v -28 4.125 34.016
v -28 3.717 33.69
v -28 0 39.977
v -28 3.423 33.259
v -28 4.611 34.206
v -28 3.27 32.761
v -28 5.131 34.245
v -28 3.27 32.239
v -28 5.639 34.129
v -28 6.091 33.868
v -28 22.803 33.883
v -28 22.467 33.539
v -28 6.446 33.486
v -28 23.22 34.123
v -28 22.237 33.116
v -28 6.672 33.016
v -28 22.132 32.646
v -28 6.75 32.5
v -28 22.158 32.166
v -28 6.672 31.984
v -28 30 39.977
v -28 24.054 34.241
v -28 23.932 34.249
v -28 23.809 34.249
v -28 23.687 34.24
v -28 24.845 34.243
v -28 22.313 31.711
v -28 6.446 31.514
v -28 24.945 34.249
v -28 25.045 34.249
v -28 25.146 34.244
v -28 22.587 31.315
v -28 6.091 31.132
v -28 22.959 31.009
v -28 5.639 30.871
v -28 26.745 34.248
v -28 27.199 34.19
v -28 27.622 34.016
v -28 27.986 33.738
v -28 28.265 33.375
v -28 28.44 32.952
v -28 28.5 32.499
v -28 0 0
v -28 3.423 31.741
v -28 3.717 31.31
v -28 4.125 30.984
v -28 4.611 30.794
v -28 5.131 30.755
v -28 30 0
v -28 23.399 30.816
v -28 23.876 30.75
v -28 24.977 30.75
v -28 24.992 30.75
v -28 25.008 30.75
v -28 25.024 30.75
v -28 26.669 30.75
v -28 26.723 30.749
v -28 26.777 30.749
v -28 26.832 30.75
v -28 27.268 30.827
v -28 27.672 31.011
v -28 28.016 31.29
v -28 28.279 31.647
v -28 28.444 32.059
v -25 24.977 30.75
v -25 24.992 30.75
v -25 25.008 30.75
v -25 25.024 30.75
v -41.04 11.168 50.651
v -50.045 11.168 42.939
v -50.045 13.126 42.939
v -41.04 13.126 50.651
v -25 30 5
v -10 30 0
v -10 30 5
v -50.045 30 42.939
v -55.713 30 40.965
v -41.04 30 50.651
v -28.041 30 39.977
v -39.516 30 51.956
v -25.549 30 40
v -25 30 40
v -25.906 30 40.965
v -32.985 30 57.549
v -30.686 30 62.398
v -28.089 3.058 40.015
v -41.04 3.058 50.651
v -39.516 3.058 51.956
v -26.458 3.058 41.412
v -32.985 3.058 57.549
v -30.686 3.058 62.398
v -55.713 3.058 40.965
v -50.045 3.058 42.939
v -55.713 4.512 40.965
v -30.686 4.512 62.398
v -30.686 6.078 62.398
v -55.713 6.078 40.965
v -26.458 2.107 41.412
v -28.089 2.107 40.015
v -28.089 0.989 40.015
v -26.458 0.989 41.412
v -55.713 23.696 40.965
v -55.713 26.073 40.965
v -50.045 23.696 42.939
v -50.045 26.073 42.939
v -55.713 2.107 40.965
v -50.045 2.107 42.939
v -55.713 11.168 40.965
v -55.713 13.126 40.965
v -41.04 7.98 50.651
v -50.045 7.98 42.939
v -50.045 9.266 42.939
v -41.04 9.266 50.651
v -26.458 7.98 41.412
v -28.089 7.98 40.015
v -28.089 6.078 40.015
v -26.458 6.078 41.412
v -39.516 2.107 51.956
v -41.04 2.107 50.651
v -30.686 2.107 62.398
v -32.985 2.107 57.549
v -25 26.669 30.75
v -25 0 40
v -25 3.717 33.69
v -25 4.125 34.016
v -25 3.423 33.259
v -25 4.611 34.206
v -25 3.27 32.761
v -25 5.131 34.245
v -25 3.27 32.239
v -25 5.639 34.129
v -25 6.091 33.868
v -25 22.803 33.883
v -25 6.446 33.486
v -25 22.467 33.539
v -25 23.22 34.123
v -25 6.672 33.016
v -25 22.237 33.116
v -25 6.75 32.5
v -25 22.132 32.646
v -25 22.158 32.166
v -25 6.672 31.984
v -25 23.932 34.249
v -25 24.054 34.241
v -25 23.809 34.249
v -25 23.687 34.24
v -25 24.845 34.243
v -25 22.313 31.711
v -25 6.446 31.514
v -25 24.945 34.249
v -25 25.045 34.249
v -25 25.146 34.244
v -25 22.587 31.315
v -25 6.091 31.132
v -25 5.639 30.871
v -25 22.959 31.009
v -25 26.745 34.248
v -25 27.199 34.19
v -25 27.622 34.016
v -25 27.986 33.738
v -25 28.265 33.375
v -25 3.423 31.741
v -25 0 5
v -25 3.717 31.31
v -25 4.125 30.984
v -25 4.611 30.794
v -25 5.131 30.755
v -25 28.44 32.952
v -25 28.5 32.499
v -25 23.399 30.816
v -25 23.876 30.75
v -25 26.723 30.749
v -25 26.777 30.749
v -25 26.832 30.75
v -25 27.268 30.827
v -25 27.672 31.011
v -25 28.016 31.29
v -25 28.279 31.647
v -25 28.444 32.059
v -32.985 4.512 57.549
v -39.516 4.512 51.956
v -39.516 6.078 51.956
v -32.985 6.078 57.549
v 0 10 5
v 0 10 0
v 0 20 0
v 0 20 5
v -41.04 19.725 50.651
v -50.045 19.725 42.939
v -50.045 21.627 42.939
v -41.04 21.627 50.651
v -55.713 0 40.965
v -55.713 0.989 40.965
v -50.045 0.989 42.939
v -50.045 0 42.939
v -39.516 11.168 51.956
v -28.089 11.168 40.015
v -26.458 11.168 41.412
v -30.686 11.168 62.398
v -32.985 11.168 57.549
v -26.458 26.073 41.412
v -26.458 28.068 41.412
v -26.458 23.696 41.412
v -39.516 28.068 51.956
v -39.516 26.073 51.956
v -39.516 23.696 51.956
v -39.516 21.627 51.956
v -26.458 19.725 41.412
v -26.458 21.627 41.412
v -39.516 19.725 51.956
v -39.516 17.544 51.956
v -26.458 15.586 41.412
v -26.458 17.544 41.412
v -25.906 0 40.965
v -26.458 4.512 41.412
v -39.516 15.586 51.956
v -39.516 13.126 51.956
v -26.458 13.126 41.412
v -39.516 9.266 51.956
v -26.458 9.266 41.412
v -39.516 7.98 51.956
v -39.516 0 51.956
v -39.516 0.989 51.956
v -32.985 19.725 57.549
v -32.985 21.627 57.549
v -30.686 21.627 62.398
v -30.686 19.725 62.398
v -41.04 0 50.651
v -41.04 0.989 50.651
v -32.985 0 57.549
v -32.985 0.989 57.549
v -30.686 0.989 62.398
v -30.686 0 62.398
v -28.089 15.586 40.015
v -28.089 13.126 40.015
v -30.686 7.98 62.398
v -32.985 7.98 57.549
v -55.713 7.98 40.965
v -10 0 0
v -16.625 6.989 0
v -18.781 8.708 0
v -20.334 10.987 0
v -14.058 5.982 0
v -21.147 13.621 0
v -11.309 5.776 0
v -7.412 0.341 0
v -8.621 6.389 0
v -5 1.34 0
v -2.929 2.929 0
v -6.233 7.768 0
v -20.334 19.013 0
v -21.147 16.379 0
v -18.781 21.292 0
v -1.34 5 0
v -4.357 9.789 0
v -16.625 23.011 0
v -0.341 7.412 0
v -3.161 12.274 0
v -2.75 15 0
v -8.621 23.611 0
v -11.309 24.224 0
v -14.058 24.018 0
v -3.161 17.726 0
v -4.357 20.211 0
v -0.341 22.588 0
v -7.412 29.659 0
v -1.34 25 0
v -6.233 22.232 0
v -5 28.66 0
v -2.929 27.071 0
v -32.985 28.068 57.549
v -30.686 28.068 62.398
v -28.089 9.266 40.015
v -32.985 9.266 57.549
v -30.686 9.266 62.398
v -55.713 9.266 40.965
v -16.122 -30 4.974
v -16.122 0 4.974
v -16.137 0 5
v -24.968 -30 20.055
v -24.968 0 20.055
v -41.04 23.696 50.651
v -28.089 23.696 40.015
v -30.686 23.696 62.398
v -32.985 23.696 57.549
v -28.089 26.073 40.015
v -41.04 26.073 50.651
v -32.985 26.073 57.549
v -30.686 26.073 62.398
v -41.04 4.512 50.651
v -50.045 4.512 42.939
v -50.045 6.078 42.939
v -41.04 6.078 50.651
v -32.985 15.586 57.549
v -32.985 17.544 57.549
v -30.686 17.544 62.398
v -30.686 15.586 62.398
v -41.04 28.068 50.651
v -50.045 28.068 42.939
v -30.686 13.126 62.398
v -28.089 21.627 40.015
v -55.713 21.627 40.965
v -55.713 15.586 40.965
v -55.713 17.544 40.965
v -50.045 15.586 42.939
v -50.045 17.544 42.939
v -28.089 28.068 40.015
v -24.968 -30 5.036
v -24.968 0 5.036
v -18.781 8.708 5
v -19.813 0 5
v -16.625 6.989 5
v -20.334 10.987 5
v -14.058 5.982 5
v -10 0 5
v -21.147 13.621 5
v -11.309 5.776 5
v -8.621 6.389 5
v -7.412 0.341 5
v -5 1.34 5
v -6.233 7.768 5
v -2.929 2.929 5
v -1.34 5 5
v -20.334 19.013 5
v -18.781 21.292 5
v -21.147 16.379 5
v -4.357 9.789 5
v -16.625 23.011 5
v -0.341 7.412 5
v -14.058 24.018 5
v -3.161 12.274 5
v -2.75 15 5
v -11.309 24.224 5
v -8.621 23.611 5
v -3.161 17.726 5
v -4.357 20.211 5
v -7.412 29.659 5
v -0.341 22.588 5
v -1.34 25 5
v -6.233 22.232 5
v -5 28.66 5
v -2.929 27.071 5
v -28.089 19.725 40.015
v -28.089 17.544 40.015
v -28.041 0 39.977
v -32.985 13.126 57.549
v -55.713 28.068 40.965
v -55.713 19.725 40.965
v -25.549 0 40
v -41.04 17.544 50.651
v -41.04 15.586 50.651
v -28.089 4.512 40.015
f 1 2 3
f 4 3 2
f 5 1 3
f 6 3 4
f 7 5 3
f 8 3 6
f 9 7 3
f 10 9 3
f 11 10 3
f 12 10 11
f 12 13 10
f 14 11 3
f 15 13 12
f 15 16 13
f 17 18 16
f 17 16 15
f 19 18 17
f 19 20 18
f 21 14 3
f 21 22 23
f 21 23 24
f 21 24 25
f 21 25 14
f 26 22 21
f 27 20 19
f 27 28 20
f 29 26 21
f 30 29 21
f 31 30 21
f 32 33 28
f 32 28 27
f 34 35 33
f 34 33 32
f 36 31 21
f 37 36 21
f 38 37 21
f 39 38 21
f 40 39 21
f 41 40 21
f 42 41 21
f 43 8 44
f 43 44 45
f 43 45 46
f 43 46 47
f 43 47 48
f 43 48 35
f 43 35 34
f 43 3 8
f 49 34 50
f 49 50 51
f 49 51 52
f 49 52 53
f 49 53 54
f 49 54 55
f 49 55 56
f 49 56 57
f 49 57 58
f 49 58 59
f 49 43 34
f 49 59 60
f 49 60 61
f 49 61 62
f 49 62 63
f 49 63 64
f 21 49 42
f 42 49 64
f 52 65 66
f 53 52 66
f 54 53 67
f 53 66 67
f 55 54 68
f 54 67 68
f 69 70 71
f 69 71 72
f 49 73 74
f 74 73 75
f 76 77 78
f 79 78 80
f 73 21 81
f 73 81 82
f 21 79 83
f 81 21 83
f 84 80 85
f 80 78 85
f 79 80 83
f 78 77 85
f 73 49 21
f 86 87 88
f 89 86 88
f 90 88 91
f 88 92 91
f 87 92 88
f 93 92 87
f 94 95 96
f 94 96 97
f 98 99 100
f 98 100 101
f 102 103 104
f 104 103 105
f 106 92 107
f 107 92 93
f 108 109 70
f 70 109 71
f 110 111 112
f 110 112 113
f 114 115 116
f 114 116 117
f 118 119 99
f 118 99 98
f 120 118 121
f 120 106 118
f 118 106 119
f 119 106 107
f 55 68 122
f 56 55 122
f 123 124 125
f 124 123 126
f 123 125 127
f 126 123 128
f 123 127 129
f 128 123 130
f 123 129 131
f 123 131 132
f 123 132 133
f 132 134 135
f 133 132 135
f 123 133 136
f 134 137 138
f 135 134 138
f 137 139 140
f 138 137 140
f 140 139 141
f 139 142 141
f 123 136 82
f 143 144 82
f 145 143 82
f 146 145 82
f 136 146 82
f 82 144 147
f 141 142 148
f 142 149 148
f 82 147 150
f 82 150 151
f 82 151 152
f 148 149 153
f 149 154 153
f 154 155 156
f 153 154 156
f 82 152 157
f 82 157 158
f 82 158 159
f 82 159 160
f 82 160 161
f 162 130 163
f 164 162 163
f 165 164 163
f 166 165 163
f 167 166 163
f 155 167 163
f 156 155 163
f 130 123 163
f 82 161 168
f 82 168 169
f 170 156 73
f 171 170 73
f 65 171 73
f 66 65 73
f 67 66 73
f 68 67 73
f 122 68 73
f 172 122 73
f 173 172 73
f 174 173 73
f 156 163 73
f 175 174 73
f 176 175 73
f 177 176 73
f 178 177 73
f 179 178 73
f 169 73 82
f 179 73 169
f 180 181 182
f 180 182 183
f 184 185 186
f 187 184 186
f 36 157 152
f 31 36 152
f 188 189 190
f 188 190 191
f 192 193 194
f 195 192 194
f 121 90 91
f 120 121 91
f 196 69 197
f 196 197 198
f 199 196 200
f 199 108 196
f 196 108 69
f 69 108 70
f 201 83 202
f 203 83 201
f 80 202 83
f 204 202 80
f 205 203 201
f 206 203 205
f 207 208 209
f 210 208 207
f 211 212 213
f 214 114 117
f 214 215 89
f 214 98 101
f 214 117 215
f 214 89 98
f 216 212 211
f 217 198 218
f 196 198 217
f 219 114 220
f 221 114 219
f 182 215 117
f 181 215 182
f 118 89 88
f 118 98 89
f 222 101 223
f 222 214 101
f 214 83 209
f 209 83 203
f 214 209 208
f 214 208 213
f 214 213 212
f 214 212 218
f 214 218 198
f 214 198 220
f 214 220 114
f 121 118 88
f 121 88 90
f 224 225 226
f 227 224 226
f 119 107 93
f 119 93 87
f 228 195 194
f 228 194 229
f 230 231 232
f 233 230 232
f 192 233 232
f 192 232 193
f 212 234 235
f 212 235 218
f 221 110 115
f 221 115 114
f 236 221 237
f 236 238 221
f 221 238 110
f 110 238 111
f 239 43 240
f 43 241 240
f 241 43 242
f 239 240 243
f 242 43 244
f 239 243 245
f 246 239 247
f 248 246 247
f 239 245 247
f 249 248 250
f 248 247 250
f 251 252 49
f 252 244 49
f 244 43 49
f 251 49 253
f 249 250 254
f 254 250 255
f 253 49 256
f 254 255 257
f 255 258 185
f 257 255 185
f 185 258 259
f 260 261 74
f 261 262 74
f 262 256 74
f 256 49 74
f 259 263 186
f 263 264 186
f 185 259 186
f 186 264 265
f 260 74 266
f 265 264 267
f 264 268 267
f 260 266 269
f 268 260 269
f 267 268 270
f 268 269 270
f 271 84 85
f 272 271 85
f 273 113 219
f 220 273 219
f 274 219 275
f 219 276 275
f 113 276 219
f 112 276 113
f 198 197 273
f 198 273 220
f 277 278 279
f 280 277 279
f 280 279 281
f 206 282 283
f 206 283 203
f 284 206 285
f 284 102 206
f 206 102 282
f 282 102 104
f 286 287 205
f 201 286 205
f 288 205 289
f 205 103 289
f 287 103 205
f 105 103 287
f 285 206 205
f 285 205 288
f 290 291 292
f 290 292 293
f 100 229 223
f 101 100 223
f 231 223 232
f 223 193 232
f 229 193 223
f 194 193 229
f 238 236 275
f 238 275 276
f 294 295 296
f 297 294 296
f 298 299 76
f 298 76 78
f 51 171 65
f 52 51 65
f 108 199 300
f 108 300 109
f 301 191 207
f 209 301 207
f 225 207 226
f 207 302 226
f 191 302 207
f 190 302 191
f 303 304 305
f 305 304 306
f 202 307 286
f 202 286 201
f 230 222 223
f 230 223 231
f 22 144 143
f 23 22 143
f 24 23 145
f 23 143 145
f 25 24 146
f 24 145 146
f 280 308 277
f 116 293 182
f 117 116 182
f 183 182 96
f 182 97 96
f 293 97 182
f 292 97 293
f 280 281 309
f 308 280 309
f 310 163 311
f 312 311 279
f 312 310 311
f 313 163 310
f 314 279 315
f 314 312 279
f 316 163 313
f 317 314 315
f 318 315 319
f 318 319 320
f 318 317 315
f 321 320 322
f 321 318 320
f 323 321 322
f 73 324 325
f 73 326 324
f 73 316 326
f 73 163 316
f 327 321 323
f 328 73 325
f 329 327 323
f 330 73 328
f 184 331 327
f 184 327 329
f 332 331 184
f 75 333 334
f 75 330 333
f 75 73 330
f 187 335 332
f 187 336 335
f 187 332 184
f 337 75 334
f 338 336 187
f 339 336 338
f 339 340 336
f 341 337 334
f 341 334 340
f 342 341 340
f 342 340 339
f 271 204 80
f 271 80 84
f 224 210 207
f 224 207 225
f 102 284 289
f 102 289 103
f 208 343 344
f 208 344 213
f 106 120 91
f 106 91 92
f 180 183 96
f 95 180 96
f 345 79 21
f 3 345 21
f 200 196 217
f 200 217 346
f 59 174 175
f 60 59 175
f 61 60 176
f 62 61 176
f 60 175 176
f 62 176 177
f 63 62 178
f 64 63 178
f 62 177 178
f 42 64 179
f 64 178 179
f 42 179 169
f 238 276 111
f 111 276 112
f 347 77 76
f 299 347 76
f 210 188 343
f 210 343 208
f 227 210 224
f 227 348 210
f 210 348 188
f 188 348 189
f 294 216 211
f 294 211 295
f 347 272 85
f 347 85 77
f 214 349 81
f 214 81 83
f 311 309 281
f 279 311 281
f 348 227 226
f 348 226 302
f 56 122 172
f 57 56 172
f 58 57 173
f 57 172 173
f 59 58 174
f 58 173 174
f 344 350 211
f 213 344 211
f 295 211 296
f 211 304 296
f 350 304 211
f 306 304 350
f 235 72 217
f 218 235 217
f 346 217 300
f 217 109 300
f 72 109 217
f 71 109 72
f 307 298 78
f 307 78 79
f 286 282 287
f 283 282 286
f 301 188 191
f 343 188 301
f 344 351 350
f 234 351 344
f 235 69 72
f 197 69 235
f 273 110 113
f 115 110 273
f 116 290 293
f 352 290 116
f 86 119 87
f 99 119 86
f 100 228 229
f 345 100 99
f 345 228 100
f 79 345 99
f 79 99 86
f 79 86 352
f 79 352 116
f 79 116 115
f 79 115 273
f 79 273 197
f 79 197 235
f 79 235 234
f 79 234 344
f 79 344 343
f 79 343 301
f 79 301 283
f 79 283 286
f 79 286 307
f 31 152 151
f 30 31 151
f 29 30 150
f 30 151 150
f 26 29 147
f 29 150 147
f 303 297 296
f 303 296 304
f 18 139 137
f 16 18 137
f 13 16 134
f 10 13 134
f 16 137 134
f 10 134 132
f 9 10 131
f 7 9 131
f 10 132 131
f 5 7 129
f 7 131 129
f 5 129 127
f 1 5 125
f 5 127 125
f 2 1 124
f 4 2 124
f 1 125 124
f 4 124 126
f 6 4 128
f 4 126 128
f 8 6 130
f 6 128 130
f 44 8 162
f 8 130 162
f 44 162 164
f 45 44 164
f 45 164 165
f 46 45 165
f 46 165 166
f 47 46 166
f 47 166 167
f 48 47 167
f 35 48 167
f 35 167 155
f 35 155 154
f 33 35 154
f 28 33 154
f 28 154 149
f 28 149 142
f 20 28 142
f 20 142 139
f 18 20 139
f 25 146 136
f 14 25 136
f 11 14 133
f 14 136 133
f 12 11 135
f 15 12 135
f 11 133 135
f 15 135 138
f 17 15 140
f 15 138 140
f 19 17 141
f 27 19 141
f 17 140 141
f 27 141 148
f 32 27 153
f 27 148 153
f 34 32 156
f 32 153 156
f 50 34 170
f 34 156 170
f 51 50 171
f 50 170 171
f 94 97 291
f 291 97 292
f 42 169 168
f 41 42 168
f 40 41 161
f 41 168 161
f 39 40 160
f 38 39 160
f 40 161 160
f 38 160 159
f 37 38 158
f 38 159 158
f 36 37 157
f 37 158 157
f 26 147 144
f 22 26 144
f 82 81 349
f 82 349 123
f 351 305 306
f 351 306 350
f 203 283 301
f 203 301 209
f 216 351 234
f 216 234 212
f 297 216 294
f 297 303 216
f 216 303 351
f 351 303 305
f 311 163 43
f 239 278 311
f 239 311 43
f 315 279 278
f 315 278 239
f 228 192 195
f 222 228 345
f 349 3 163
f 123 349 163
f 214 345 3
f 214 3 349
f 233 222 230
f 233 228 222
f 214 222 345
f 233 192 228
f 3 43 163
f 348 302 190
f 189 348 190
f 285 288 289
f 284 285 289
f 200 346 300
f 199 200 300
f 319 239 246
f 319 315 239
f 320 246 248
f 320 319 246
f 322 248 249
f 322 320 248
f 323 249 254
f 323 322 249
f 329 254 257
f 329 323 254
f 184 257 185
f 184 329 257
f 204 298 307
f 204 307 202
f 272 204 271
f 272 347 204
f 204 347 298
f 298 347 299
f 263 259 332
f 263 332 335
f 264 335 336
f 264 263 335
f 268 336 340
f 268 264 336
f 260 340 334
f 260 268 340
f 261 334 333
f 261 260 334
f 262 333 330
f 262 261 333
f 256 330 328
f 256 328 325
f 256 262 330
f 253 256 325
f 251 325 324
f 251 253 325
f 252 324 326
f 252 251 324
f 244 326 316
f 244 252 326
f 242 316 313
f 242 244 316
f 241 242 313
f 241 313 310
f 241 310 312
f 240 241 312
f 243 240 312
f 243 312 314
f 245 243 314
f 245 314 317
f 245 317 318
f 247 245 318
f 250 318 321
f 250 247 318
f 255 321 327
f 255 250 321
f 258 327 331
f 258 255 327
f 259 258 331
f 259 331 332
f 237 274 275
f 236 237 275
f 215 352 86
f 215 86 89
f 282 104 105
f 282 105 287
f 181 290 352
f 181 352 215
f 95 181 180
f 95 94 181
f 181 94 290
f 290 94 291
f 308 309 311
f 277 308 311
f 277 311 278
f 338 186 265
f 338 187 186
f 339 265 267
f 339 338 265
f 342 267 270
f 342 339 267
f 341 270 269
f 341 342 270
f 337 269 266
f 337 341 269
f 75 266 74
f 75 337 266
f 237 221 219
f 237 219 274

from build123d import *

# Parameters (mm, degrees)
F0_W      = 25
F0_H      = 30
F0_R      = 9.25
F0_W_2    = 3
F1_DEPTH  = 5
F2_DEPTH  = 40
F3_R      = 10
F4_R      = 1.75
F5_DEPTH  = 3.001
F7_DEPTH  = 30
F8_W      = 32.9495297466
F8_H      = 1.9953548908
F8_H_2    = 2.0693931729
F8_H_3    = 2.1812524647
F8_H_4    = 2.4609006941
F8_H_5    = 1.9016051665
F8_H_6    = 1.9016047008
F8_H_7    = 1.454168465
F8_H_8    = 1.1185912881
F9_DEPTH  = 18.69
F11_DEPTH = 30.001
F13_DEPTH = 30


with BuildPart() as f1:
    # F0 (on Top) → F1 (new body)
    with BuildSketch(Plane.XY):
        with Locations((-12.5, 15)):
            Rectangle(F0_W, F0_H)
        with Locations((-12, 15)):
            Circle(F0_R, mode=Mode.SUBTRACT)
        with Locations((-26.5, 15)):
            Rectangle(F0_W_2, F0_H)
    extrude(amount=F1_DEPTH)

    # F0 (on Top) → F2 (join)
    with BuildSketch(Plane.XY):
        with Locations((-26.5, 15)):
            Rectangle(F0_W_2, F0_H)
    extrude(amount=F2_DEPTH)

    # F3
    f3_edges = [f1.edges().sort_by_distance(p)[0] for p in [
        (0, 0, 2.5),
        (0, 30, 2.5),
    ]]
    fillet(f3_edges, radius=F3_R)

    # F4 (on face) → F5 (cut, through all)
    with BuildSketch(Plane.YZ.offset(-25)):
        with Locations((5, 32.5)):
            Circle(F4_R)
        with BuildLine():
            ThreePointArc((25.8762976423, 34.0147945214), (26.5159190074, 33.3743509381), (26.75, 32.5))
            ThreePointArc((26.75, 32.5), (26.5151696279, 31.6243510986), (25.8737017159, 30.9837067198))
            ThreePointArc((25.8737017159, 30.9837067198), (26.2572446424, 30.8193071518), (26.6688053839, 30.7503858164))
            Line((26.6688053839, 30.7503858164), (26.8316769531, 30.7504083459))
            ThreePointArc((26.8316769531, 30.7504083459), (28.015984309, 31.290286813), (28.4999993582, 32.4985012412))
            ThreePointArc((28.4999993582, 32.4985012412), (27.9856735638, 33.7376982625), (26.7450173494, 34.2484941496))
            ThreePointArc((26.7450173494, 34.2484941496), (26.2953839701, 34.1884198336), (25.8762976423, 34.0147945214))
        make_face()
        with BuildLine():
            ThreePointArc((25.313264961, 33.4976480132), (25.5661966357, 33.7873422376), (25.8762976423, 34.0147945214))
            ThreePointArc((25.8762976423, 34.0147945214), (25.5235901108, 34.1698363381), (25.1455039627, 34.2439405371))
            Line((25.1455039627, 34.2439405371), (24.8445689194, 34.243083813))
            ThreePointArc((24.8445689194, 34.243083813), (24.6385972754, 34.2122756994), (24.4377440921, 34.1572170329))
            ThreePointArc((24.4377440921, 34.1572170329), (24.9284794863, 33.8977522036), (25.313264961, 33.4976480132))
        make_face()
        with BuildLine():
            ThreePointArc((25.1455039627, 34.2439405371), (25.5235901108, 34.1698363381), (25.8762976423, 34.0147945214))
            ThreePointArc((25.8762976423, 34.0147945214), (26.2953839701, 34.1884198336), (26.7450173494, 34.2484941496))
            Line((26.7450173494, 34.2484941496), (25.1455039627, 34.2439405371))
        make_face()
        with BuildLine():
            ThreePointArc((26.6688053839, 30.7503858164), (26.2572446424, 30.8193071518), (25.8737017159, 30.9837067198))
            ThreePointArc((25.8737017159, 30.9837067198), (25.4635661352, 30.8125147591), (25.0235325622, 30.7501582304))
            Line((25.0235325622, 30.7501582304), (26.6688053839, 30.7503858164))
        make_face()
        with BuildLine():
            ThreePointArc((25.0235325622, 30.7501582304), (25.4635661352, 30.8125147591), (25.8737017159, 30.9837067198))
            ThreePointArc((25.8737017159, 30.9837067198), (25.5644222061, 31.2112923163), (25.3122242271, 31.5008526697))
            ThreePointArc((25.3122242271, 31.5008526697), (24.927751526, 31.1016985717), (24.4377457378, 30.8427824088))
            ThreePointArc((24.4377457378, 30.8427824088), (24.7037063498, 30.7752652167), (24.97695154, 30.750151787))
            Line((24.97695154, 30.750151787), (25.0235325622, 30.7501582304))
        make_face()
        with BuildLine():
            Line((24.8445689194, 34.243083813), (25.1455039627, 34.2439405371))
            ThreePointArc((25.1455039627, 34.2439405371), (24.9950179912, 34.2499929084), (24.8445689194, 34.243083813))
        make_face()
        with BuildLine():
            ThreePointArc((24.97695154, 30.750151787), (25.0002420726, 30.7500000167), (25.0235325622, 30.7501582304))
            Line((25.0235325622, 30.7501582304), (24.97695154, 30.750151787))
        make_face()
        with BuildLine():
            Line((26.8316769531, 30.7504083459), (26.6688053839, 30.7503858164))
            ThreePointArc((26.6688053839, 30.7503858164), (26.7502414308, 30.7485012579), (26.8316769531, 30.7504083459))
        make_face()
        with BuildLine():
            ThreePointArc((24.4377440921, 34.1572170329), (24.6385972754, 34.2122756994), (24.8445689194, 34.243083813))
            Line((24.8445689194, 34.243083813), (24.0543595868, 34.2408341869))
            ThreePointArc((24.0543595868, 34.2408341869), (24.248402903, 34.2098052318), (24.4377440921, 34.1572170329))
        make_face()
        with BuildLine():
            ThreePointArc((24.4377457378, 30.8427824088), (23.25, 32.4999991311), (24.4377440921, 34.1572170329))
            ThreePointArc((24.4377440921, 34.1572170329), (24.248402903, 34.2098052318), (24.0543595868, 34.2408341869))
            Line((24.0543595868, 34.2408341869), (23.6867111794, 34.2397875383))
            ThreePointArc((23.6867111794, 34.2397875383), (22.1280512127, 32.4053512558), (23.8757319025, 30.7499994584))
            ThreePointArc((23.8757319025, 30.7499994584), (24.1605392352, 30.7733706928), (24.4377457378, 30.8427824088))
        make_face()
        with BuildLine():
            Line((23.8757319025, 30.7499994584), (24.97695154, 30.750151787))
            ThreePointArc((24.97695154, 30.750151787), (24.7037063498, 30.7752652167), (24.4377457378, 30.8427824088))
            ThreePointArc((24.4377457378, 30.8427824088), (24.1605392352, 30.7733706928), (23.8757319025, 30.7499994584))
        make_face()
        with BuildLine():
            Line((23.6867111794, 34.2397875383), (24.0543595868, 34.2408341869))
            ThreePointArc((24.0543595868, 34.2408341869), (23.8705078211, 34.2499923501), (23.6867111794, 34.2397875383))
        make_face()
        with BuildLine():
            ThreePointArc((25.8737017159, 30.9837067198), (26.5151696279, 31.6243510986), (26.75, 32.5))
            ThreePointArc((26.75, 32.5), (26.5159190074, 33.3743509381), (25.8762976423, 34.0147945214))
            ThreePointArc((25.8762976423, 34.0147945214), (25.5661966357, 33.7873422376), (25.313264961, 33.4976480132))
            ThreePointArc((25.313264961, 33.4976480132), (25.545610556, 33.0226817163), (25.6254898299, 32.4999994417))
            ThreePointArc((25.6254898299, 32.4999994417), (25.5453379061, 31.9764467676), (25.3122242271, 31.5008526697))
            ThreePointArc((25.3122242271, 31.5008526697), (25.5644222061, 31.2112923163), (25.8737017159, 30.9837067198))
        make_face()
        with BuildLine():
            ThreePointArc((25.3122242271, 31.5008526697), (24.9999995959, 32.4994133448), (25.313264961, 33.4976480132))
            ThreePointArc((25.313264961, 33.4976480132), (24.9284794863, 33.8977522036), (24.4377440921, 34.1572170329))
            ThreePointArc((24.4377440921, 34.1572170329), (23.25, 32.4999991311), (24.4377457378, 30.8427824088))
            ThreePointArc((24.4377457378, 30.8427824088), (24.927751526, 31.1016985717), (25.3122242271, 31.5008526697))
        make_face()
        with BuildLine():
            ThreePointArc((25.6254898299, 32.4999994417), (25.545610556, 33.0226817163), (25.313264961, 33.4976480132))
            ThreePointArc((25.313264961, 33.4976480132), (24.9999995959, 32.4994133448), (25.3122242271, 31.5008526697))
            ThreePointArc((25.3122242271, 31.5008526697), (25.5453379061, 31.9764467676), (25.6254898299, 32.4999994417))
        make_face()
    extrude(amount=-F5_DEPTH, mode=Mode.SUBTRACT)

    # F6 (on Front) → F7 (join)
    with BuildSketch(Plane.XZ):
        Polygon((-25.9058196098, 40.9654118121), (-39.5162117863, 51.9557070245), (-41.0396176132, 50.6510883904), (-28.0414205045, 39.976708591), (-25.5407467018, 39.976708591), align=None)
        Polygon((-29.4997693367, 60.5336166234), (-30.6862313423, 62.3977148942), (-55.7127751532, 40.9654118121), (-54.2898289063, 39.3038345914), (-41.0396176132, 50.6510883904), (-39.5162117863, 51.9557070245), align=None)
    extrude(amount=-F7_DEPTH)

    # F8 (on face) → F9 (cut)
    with BuildSketch(Plane(origin=(-43.8108490147, 0, 51.1580173188), x_dir=(0.7595417599, 0, 0.6504585421), z_dir=(-0.6504585421, 0, 0.7595417599))):
        with Locations((0.8048876299, 27.0703136921)):
            Rectangle(F8_W, F8_H)
        with Locations((0.8048876299, 22.6615490392)):
            Rectangle(F8_W, F8_H_2)
        with Locations((0.8048876299, 18.6346201226)):
            Rectangle(F8_W, F8_H_3)
        with Locations((0.8048876299, 14.3560096622)):
            Rectangle(F8_W, F8_H_4)
        with Locations((0.8048876299, 10.2172228508)):
            Rectangle(F8_W, F8_H_5)
        with Locations((0.8048876299, 7.0292379241)):
            Rectangle(F8_W, F8_H_6)
        with Locations((0.8048876299, 3.7853235845)):
            Rectangle(F8_W, F8_H_7)
        with Locations((0.8048876299, 1.5481411247)):
            Rectangle(F8_W, F8_H_8)
    extrude(amount=-F9_DEPTH, mode=Mode.SUBTRACT)

    # F10 (on face) → F11 (cut, through all)
    with BuildSketch(Plane(origin=(0, 30, 0), x_dir=(-1, 0, 0), z_dir=(0, 1, 0))):
        Polygon((32.9848708997, 57.549035391), (30.6862313423, 62.3977148942), (29.4997693367, 60.5336166234), align=None)
        Polygon((50.0453349621, 42.9387464406), (54.2898289063, 39.3038345914), (55.7127751532, 40.9654118121), align=None)
    extrude(amount=-F11_DEPTH, mode=Mode.SUBTRACT)

    # F12 (on Front) → F13 (join)
    with BuildSketch(Plane.XZ):
        Polygon((-24.968046695, 20.0552176684), (-24.968046695, 5.0357975997), (-16.1222536117, 4.974368494), align=None)
    extrude(amount=F13_DEPTH)


solid = f1.part
